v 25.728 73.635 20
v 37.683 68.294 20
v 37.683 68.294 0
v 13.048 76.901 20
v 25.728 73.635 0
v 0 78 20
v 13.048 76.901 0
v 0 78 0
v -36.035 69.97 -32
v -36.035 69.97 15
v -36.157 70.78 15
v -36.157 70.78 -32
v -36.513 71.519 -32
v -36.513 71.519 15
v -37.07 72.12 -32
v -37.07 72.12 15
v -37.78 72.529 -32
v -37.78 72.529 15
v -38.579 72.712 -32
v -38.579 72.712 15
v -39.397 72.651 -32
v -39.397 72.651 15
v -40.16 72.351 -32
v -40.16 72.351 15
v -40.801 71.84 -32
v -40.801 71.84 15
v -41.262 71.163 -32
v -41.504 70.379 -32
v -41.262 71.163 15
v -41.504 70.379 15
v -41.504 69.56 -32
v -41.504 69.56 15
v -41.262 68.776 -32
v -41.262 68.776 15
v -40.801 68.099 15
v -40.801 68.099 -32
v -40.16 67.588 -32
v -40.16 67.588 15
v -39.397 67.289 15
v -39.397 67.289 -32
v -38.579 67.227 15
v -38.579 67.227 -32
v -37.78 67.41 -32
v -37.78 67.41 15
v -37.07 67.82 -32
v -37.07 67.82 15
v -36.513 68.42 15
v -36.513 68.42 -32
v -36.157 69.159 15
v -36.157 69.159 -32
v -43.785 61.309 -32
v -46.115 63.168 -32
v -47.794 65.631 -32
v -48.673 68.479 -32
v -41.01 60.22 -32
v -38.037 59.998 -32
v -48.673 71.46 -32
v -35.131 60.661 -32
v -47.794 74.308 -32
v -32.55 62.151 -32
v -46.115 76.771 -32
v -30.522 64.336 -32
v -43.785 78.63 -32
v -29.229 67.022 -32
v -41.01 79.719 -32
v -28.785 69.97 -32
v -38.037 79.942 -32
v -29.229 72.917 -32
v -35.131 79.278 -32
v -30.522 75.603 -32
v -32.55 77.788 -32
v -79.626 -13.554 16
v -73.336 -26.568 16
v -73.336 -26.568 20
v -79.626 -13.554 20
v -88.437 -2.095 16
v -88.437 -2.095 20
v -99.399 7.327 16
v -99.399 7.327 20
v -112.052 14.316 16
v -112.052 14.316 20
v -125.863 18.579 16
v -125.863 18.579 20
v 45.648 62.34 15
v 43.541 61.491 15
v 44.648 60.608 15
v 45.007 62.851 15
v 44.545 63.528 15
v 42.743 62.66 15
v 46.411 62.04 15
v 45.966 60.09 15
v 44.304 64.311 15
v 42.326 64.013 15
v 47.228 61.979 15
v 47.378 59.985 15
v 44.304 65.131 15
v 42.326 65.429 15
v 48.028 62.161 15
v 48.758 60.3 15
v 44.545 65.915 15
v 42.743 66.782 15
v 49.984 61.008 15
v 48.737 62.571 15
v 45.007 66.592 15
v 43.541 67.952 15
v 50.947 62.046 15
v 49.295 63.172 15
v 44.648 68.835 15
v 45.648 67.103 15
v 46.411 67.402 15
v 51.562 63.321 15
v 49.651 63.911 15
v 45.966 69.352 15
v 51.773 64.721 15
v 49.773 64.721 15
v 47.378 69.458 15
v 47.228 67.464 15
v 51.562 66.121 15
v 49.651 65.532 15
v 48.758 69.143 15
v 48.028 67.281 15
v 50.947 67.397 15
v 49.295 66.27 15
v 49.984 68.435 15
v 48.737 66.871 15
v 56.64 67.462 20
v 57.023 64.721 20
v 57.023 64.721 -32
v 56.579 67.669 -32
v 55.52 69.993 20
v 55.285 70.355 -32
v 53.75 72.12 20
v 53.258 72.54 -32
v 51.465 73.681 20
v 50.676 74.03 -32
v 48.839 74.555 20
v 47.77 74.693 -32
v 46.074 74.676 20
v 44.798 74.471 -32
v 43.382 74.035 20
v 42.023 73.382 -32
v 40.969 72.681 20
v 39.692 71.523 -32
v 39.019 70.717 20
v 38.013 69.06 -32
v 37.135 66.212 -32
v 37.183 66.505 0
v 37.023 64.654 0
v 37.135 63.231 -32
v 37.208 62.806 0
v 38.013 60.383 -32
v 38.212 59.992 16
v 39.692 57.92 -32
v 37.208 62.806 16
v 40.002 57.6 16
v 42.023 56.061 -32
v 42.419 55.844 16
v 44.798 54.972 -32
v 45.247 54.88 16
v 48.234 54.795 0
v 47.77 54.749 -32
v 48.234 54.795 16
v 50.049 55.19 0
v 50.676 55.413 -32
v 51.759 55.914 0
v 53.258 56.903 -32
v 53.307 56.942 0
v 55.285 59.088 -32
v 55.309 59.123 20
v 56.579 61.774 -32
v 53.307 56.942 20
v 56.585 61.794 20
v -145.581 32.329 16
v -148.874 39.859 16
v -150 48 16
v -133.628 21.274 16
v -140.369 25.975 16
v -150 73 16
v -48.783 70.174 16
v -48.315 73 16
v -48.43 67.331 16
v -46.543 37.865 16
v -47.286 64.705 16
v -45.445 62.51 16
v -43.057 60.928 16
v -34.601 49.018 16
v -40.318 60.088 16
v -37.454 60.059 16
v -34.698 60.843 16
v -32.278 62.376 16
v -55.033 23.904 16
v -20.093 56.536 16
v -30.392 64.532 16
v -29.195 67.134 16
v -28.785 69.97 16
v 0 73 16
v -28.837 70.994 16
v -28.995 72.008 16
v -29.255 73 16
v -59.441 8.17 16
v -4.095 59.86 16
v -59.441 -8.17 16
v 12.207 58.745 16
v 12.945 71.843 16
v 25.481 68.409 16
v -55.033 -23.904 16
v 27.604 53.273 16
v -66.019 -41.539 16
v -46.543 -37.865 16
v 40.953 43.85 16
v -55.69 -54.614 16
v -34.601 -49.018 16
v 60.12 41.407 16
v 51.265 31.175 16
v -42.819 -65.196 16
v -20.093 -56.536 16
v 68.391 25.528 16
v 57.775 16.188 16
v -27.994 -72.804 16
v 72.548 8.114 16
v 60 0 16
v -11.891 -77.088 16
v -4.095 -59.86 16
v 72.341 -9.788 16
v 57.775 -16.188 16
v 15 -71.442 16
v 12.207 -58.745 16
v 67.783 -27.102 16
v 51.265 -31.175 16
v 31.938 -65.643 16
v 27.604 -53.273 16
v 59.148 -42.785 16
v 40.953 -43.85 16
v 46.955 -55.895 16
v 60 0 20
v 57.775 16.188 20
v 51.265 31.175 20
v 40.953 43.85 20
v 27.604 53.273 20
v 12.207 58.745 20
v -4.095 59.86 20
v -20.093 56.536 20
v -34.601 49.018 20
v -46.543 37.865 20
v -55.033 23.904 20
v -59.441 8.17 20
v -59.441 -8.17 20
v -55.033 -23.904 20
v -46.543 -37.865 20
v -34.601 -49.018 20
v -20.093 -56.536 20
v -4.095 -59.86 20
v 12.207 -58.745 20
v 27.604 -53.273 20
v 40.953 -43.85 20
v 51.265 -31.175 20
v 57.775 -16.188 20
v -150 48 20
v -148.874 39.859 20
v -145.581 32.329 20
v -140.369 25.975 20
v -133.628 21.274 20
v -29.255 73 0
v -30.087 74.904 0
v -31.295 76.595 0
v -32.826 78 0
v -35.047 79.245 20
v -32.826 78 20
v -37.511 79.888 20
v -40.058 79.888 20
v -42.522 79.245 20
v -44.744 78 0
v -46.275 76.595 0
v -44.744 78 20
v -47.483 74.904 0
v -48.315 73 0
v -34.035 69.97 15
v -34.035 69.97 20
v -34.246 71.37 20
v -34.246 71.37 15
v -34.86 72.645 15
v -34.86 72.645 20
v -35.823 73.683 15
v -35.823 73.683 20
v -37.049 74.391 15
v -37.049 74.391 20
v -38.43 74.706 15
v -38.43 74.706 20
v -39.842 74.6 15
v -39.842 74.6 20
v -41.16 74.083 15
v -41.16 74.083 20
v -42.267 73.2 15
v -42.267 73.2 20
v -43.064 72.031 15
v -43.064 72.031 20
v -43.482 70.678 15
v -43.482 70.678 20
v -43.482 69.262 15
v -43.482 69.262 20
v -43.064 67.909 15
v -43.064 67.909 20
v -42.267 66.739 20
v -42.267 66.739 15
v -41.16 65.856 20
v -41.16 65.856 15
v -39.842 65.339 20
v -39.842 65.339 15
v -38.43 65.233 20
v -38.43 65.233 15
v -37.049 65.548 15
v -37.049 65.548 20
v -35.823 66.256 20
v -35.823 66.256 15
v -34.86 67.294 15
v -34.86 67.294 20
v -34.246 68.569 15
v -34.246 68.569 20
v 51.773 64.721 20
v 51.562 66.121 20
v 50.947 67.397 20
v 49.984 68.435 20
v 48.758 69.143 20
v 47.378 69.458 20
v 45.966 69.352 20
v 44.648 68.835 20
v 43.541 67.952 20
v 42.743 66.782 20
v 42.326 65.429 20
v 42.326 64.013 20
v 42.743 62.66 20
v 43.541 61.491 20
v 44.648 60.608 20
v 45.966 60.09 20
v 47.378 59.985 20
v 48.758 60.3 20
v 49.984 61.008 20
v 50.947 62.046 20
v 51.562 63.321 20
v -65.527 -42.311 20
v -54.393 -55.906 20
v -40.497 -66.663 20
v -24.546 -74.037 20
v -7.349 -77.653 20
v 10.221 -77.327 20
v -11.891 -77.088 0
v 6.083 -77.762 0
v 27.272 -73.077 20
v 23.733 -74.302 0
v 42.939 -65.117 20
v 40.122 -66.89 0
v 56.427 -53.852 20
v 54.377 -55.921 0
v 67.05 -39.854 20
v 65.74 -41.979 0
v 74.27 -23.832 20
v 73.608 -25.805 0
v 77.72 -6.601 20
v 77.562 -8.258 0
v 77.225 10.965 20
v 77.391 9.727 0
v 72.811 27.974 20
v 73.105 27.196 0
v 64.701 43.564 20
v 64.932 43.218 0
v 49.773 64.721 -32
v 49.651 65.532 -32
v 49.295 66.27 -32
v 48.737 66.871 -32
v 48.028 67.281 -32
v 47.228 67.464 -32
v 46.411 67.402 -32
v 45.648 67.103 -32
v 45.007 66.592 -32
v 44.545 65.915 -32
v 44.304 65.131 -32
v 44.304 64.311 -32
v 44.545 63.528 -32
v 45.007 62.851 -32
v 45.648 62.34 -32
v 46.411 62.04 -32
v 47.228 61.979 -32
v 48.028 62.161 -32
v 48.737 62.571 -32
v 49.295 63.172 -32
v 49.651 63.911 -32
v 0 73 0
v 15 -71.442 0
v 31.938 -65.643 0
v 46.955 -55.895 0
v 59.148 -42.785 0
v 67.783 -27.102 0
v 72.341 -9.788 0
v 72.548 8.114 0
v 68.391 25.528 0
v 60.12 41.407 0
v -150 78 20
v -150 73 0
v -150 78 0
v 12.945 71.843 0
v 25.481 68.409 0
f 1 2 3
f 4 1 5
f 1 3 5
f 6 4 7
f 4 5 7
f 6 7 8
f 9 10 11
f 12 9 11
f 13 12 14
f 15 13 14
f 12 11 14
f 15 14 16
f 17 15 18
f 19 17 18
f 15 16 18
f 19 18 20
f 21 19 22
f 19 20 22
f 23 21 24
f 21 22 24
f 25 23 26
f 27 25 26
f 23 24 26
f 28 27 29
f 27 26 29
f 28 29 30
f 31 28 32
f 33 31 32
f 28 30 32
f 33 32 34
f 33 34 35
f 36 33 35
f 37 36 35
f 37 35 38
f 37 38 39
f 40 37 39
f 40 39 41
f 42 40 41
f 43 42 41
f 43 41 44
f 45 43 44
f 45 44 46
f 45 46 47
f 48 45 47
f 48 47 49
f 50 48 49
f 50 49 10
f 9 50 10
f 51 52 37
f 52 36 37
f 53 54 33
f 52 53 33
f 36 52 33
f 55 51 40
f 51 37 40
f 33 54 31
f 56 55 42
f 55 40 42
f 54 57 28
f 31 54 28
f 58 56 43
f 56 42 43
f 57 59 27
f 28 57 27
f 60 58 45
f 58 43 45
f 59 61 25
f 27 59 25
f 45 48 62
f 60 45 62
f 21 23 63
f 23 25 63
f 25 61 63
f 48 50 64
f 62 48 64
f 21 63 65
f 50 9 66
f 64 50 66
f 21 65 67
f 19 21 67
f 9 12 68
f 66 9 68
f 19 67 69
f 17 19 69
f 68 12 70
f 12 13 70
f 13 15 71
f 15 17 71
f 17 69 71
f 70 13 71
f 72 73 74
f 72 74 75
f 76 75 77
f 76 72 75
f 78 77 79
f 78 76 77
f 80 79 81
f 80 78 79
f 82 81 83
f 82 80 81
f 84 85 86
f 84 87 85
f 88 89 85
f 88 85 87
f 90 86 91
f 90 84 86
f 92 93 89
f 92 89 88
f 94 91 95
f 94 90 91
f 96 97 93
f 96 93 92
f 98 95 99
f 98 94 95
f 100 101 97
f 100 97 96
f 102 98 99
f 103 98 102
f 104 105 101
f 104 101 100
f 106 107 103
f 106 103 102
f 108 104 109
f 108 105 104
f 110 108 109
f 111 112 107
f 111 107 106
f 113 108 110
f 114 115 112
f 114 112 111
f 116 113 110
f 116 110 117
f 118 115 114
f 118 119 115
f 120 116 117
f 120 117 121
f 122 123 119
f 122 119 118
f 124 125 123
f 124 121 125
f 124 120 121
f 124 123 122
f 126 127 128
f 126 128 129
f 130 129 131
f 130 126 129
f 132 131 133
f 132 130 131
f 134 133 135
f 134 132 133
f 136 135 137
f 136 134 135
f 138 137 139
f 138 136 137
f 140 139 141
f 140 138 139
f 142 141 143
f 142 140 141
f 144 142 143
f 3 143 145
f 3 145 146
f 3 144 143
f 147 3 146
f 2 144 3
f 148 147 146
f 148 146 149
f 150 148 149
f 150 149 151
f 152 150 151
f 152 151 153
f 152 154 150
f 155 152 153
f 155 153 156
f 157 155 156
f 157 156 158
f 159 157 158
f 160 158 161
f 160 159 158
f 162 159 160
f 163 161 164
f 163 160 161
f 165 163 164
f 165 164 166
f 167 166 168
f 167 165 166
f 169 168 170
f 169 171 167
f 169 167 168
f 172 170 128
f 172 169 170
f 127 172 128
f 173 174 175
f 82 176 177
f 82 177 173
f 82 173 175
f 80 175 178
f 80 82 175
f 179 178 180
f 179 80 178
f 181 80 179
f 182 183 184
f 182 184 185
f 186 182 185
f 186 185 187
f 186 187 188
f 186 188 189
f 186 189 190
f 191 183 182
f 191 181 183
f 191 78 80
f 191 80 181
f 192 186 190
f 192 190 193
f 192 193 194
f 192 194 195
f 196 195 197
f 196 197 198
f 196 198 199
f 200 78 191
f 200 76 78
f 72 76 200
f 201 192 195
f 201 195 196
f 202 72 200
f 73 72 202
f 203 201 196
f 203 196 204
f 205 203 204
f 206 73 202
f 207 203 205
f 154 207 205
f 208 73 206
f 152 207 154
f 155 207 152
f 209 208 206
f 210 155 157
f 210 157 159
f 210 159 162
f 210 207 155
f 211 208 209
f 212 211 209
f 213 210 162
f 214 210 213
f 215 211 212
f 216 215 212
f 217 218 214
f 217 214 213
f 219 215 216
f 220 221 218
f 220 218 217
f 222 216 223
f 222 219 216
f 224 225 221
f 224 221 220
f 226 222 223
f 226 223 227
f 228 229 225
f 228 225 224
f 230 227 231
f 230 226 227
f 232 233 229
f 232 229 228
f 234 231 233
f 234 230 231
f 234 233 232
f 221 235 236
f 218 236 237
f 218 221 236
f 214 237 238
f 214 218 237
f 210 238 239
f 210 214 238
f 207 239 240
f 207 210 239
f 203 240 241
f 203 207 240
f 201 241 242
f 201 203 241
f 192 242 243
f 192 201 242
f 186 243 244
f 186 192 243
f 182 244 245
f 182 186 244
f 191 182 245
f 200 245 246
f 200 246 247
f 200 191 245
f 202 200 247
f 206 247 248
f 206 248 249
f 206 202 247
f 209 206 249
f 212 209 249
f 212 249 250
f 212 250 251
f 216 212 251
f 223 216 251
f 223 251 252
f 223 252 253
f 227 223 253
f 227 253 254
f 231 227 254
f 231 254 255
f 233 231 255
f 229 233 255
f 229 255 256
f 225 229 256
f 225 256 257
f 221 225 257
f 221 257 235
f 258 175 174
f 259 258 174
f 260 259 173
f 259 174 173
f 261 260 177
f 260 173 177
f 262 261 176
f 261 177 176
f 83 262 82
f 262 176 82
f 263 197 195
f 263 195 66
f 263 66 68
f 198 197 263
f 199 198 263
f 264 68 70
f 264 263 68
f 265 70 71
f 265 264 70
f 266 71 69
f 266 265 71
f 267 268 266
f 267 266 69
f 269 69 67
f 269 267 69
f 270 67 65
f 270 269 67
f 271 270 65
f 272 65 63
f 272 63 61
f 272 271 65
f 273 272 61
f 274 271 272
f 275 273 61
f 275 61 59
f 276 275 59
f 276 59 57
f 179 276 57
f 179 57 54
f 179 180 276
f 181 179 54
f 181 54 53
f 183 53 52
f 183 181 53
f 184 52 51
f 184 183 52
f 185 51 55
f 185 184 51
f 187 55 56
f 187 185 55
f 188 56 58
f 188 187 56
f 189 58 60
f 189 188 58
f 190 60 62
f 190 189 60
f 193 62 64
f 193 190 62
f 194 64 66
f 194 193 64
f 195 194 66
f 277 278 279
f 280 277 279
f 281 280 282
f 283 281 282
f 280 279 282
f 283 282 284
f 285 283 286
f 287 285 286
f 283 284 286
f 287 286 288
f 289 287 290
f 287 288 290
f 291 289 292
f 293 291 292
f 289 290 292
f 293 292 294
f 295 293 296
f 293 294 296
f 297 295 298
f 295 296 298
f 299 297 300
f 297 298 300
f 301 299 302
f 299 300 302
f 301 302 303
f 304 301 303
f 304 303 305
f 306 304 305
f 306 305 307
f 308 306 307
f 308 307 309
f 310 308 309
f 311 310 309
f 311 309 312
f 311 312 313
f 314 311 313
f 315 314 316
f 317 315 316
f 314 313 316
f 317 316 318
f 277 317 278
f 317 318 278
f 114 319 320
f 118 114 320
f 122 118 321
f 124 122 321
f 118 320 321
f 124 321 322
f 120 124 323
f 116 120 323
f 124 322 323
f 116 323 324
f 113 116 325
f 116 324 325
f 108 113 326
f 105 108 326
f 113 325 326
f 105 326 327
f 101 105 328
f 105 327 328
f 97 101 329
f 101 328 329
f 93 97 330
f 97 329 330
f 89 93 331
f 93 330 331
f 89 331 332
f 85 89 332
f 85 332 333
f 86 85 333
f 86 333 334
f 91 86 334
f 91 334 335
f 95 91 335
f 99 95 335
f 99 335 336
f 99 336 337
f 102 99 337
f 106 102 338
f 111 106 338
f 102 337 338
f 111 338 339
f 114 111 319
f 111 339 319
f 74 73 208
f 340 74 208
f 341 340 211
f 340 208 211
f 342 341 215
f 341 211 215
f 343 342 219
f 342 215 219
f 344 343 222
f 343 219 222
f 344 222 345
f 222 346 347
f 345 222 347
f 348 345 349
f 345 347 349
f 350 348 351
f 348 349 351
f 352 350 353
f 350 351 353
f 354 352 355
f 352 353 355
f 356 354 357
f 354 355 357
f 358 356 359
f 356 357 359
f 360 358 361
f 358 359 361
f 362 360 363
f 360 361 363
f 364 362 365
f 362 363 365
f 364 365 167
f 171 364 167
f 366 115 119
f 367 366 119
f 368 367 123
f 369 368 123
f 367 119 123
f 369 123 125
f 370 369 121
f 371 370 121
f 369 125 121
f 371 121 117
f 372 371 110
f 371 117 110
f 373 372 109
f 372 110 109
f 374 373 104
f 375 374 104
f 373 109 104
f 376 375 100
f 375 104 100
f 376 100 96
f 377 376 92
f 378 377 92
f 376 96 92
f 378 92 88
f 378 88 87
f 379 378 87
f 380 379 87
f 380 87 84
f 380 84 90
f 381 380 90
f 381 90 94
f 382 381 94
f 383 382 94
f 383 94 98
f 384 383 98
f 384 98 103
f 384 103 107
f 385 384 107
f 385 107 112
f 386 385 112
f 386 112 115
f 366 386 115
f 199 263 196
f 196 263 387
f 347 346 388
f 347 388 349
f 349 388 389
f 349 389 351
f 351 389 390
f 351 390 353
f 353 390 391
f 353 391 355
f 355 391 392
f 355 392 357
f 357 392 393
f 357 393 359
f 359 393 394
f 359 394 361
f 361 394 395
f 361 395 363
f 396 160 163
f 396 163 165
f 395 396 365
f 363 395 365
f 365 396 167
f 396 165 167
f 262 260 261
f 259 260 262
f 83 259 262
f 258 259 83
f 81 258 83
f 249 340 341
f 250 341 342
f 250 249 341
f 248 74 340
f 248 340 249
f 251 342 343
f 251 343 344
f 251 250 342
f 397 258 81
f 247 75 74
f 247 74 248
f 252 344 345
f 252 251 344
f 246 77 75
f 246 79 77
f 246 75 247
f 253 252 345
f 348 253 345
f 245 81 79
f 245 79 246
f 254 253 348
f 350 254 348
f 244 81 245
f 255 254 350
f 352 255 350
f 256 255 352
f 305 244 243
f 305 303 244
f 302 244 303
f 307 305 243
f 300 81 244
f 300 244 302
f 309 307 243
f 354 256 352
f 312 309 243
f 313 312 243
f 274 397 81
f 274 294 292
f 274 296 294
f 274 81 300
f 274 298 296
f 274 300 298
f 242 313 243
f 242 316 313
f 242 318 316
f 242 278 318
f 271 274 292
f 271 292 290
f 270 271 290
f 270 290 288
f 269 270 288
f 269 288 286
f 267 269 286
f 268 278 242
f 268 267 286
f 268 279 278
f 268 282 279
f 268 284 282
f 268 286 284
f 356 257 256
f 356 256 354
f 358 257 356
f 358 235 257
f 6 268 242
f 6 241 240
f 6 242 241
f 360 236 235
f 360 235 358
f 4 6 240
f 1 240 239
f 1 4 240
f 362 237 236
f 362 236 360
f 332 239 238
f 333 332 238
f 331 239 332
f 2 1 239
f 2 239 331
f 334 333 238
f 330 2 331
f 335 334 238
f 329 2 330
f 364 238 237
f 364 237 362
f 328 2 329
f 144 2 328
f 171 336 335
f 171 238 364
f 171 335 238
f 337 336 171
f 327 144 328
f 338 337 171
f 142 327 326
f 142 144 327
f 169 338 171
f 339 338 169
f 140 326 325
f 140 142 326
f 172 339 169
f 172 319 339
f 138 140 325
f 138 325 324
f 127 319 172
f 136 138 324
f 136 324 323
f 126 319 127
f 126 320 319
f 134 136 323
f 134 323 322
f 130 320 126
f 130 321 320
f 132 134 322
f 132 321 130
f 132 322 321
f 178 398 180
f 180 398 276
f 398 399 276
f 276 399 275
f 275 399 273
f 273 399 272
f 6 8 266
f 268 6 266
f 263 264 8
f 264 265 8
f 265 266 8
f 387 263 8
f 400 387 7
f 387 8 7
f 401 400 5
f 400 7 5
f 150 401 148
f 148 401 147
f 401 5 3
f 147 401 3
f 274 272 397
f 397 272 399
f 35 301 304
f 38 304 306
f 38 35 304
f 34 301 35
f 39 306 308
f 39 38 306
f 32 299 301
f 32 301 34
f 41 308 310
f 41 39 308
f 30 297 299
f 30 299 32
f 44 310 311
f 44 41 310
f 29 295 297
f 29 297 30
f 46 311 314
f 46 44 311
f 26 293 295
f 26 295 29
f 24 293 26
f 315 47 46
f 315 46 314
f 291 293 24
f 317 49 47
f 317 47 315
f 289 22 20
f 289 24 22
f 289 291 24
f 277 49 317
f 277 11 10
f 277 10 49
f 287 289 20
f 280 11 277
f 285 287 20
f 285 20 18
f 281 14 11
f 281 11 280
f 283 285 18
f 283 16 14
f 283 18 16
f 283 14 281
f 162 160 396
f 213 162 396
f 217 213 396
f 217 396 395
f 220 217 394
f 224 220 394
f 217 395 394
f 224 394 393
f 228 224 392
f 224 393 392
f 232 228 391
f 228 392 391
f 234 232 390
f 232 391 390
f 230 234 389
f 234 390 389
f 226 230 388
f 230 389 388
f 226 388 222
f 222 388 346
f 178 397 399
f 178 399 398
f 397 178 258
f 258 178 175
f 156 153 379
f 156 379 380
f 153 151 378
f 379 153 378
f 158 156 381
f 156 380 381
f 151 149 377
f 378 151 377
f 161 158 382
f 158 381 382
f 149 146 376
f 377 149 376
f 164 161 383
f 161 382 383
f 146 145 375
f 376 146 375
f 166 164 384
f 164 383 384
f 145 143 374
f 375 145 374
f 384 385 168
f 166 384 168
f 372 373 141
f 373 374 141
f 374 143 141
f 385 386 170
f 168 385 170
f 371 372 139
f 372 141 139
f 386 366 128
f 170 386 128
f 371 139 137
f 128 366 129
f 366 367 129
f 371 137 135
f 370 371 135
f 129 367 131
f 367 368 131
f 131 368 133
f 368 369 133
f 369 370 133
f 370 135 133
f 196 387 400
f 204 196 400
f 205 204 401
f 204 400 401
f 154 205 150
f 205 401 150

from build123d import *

# Parameters (mm, degrees)
SKETCH_R        = 60
PAD_DEPTH       = 20
POCKET_DEPTH    = 16
SKETCH002_R     = 10
PAD001_DEPTH    = 52
SKETCH003_R     = 2.75
POCKET001_DEPTH = 52.001
SKETCH004_R     = 4.75
POCKET002_DEPTH = 5


with BuildPart() as part:
    # Sketch → Pad (new body)
    with BuildSketch(Plane.XY):
        with BuildLine():
            Line((0, 78), (-150, 78))
            Line((-150, 78), (-150, 48))
            ThreePointArc((-150, 48), (-143.193791, 28.97244), (-125.863464, 18.578583))
            ThreePointArc((-73.335895, -26.567772), (-93.676152, 2.897401), (-125.863464, 18.578583))
            ThreePointArc((-73.335895, -26.567772), (63.860341, -44.786794), (0, 78))
        make_face()
        Circle(SKETCH_R, mode=Mode.SUBTRACT)
    extrude(amount=PAD_DEPTH)

    # Sketch001 (on Face7 of Pad) → Pocket (cut)
    with BuildSketch(Plane(origin=(0, 0, 0), x_dir=(1, 0, 0), z_dir=(0, 0, -1))):
        with BuildLine():
            Line((-185.14, -73), (0, -73))
            ThreePointArc((0, -73), (72.609527, -7.540333), (15, 71.442284))
            Line((15, 71.442284), (-105.864687, 96.818997))
            Line((-105.864687, 96.818997), (-185.14, -73))
        make_face()
    extrude(amount=-POCKET_DEPTH, mode=Mode.SUBTRACT)

    # Sketch002 (on Face5 of Pocket) → Pad001 (join)
    with BuildSketch(Plane.XY.offset(20)):
        with Locations((-38.78477, 69.969577)):
            Circle(SKETCH002_R)
        with Locations((47.02282, 64.72136)):
            Circle(SKETCH002_R)
    extrude(amount=-PAD001_DEPTH)

    # Sketch003 (on Face22 of Pad001) → Pocket001 (cut, through all)
    with BuildSketch(Plane.XY.offset(20)):
        with Locations((-38.78477, 69.969577)):
            Circle(SKETCH003_R)
        with Locations((47.02282, 64.72136)):
            Circle(SKETCH003_R)
    extrude(amount=-POCKET001_DEPTH, mode=Mode.SUBTRACT)

    # Sketch004 (on Face20 of Pocket001) → Pocket002 (cut)
    with BuildSketch(Plane.XY.offset(20)):
        with Locations((-38.78477, 69.969577)):
            Circle(SKETCH004_R)
        with Locations((47.02282, 64.72136)):
            Circle(SKETCH004_R)
    extrude(amount=-POCKET002_DEPTH, mode=Mode.SUBTRACT)


solid = part.part
